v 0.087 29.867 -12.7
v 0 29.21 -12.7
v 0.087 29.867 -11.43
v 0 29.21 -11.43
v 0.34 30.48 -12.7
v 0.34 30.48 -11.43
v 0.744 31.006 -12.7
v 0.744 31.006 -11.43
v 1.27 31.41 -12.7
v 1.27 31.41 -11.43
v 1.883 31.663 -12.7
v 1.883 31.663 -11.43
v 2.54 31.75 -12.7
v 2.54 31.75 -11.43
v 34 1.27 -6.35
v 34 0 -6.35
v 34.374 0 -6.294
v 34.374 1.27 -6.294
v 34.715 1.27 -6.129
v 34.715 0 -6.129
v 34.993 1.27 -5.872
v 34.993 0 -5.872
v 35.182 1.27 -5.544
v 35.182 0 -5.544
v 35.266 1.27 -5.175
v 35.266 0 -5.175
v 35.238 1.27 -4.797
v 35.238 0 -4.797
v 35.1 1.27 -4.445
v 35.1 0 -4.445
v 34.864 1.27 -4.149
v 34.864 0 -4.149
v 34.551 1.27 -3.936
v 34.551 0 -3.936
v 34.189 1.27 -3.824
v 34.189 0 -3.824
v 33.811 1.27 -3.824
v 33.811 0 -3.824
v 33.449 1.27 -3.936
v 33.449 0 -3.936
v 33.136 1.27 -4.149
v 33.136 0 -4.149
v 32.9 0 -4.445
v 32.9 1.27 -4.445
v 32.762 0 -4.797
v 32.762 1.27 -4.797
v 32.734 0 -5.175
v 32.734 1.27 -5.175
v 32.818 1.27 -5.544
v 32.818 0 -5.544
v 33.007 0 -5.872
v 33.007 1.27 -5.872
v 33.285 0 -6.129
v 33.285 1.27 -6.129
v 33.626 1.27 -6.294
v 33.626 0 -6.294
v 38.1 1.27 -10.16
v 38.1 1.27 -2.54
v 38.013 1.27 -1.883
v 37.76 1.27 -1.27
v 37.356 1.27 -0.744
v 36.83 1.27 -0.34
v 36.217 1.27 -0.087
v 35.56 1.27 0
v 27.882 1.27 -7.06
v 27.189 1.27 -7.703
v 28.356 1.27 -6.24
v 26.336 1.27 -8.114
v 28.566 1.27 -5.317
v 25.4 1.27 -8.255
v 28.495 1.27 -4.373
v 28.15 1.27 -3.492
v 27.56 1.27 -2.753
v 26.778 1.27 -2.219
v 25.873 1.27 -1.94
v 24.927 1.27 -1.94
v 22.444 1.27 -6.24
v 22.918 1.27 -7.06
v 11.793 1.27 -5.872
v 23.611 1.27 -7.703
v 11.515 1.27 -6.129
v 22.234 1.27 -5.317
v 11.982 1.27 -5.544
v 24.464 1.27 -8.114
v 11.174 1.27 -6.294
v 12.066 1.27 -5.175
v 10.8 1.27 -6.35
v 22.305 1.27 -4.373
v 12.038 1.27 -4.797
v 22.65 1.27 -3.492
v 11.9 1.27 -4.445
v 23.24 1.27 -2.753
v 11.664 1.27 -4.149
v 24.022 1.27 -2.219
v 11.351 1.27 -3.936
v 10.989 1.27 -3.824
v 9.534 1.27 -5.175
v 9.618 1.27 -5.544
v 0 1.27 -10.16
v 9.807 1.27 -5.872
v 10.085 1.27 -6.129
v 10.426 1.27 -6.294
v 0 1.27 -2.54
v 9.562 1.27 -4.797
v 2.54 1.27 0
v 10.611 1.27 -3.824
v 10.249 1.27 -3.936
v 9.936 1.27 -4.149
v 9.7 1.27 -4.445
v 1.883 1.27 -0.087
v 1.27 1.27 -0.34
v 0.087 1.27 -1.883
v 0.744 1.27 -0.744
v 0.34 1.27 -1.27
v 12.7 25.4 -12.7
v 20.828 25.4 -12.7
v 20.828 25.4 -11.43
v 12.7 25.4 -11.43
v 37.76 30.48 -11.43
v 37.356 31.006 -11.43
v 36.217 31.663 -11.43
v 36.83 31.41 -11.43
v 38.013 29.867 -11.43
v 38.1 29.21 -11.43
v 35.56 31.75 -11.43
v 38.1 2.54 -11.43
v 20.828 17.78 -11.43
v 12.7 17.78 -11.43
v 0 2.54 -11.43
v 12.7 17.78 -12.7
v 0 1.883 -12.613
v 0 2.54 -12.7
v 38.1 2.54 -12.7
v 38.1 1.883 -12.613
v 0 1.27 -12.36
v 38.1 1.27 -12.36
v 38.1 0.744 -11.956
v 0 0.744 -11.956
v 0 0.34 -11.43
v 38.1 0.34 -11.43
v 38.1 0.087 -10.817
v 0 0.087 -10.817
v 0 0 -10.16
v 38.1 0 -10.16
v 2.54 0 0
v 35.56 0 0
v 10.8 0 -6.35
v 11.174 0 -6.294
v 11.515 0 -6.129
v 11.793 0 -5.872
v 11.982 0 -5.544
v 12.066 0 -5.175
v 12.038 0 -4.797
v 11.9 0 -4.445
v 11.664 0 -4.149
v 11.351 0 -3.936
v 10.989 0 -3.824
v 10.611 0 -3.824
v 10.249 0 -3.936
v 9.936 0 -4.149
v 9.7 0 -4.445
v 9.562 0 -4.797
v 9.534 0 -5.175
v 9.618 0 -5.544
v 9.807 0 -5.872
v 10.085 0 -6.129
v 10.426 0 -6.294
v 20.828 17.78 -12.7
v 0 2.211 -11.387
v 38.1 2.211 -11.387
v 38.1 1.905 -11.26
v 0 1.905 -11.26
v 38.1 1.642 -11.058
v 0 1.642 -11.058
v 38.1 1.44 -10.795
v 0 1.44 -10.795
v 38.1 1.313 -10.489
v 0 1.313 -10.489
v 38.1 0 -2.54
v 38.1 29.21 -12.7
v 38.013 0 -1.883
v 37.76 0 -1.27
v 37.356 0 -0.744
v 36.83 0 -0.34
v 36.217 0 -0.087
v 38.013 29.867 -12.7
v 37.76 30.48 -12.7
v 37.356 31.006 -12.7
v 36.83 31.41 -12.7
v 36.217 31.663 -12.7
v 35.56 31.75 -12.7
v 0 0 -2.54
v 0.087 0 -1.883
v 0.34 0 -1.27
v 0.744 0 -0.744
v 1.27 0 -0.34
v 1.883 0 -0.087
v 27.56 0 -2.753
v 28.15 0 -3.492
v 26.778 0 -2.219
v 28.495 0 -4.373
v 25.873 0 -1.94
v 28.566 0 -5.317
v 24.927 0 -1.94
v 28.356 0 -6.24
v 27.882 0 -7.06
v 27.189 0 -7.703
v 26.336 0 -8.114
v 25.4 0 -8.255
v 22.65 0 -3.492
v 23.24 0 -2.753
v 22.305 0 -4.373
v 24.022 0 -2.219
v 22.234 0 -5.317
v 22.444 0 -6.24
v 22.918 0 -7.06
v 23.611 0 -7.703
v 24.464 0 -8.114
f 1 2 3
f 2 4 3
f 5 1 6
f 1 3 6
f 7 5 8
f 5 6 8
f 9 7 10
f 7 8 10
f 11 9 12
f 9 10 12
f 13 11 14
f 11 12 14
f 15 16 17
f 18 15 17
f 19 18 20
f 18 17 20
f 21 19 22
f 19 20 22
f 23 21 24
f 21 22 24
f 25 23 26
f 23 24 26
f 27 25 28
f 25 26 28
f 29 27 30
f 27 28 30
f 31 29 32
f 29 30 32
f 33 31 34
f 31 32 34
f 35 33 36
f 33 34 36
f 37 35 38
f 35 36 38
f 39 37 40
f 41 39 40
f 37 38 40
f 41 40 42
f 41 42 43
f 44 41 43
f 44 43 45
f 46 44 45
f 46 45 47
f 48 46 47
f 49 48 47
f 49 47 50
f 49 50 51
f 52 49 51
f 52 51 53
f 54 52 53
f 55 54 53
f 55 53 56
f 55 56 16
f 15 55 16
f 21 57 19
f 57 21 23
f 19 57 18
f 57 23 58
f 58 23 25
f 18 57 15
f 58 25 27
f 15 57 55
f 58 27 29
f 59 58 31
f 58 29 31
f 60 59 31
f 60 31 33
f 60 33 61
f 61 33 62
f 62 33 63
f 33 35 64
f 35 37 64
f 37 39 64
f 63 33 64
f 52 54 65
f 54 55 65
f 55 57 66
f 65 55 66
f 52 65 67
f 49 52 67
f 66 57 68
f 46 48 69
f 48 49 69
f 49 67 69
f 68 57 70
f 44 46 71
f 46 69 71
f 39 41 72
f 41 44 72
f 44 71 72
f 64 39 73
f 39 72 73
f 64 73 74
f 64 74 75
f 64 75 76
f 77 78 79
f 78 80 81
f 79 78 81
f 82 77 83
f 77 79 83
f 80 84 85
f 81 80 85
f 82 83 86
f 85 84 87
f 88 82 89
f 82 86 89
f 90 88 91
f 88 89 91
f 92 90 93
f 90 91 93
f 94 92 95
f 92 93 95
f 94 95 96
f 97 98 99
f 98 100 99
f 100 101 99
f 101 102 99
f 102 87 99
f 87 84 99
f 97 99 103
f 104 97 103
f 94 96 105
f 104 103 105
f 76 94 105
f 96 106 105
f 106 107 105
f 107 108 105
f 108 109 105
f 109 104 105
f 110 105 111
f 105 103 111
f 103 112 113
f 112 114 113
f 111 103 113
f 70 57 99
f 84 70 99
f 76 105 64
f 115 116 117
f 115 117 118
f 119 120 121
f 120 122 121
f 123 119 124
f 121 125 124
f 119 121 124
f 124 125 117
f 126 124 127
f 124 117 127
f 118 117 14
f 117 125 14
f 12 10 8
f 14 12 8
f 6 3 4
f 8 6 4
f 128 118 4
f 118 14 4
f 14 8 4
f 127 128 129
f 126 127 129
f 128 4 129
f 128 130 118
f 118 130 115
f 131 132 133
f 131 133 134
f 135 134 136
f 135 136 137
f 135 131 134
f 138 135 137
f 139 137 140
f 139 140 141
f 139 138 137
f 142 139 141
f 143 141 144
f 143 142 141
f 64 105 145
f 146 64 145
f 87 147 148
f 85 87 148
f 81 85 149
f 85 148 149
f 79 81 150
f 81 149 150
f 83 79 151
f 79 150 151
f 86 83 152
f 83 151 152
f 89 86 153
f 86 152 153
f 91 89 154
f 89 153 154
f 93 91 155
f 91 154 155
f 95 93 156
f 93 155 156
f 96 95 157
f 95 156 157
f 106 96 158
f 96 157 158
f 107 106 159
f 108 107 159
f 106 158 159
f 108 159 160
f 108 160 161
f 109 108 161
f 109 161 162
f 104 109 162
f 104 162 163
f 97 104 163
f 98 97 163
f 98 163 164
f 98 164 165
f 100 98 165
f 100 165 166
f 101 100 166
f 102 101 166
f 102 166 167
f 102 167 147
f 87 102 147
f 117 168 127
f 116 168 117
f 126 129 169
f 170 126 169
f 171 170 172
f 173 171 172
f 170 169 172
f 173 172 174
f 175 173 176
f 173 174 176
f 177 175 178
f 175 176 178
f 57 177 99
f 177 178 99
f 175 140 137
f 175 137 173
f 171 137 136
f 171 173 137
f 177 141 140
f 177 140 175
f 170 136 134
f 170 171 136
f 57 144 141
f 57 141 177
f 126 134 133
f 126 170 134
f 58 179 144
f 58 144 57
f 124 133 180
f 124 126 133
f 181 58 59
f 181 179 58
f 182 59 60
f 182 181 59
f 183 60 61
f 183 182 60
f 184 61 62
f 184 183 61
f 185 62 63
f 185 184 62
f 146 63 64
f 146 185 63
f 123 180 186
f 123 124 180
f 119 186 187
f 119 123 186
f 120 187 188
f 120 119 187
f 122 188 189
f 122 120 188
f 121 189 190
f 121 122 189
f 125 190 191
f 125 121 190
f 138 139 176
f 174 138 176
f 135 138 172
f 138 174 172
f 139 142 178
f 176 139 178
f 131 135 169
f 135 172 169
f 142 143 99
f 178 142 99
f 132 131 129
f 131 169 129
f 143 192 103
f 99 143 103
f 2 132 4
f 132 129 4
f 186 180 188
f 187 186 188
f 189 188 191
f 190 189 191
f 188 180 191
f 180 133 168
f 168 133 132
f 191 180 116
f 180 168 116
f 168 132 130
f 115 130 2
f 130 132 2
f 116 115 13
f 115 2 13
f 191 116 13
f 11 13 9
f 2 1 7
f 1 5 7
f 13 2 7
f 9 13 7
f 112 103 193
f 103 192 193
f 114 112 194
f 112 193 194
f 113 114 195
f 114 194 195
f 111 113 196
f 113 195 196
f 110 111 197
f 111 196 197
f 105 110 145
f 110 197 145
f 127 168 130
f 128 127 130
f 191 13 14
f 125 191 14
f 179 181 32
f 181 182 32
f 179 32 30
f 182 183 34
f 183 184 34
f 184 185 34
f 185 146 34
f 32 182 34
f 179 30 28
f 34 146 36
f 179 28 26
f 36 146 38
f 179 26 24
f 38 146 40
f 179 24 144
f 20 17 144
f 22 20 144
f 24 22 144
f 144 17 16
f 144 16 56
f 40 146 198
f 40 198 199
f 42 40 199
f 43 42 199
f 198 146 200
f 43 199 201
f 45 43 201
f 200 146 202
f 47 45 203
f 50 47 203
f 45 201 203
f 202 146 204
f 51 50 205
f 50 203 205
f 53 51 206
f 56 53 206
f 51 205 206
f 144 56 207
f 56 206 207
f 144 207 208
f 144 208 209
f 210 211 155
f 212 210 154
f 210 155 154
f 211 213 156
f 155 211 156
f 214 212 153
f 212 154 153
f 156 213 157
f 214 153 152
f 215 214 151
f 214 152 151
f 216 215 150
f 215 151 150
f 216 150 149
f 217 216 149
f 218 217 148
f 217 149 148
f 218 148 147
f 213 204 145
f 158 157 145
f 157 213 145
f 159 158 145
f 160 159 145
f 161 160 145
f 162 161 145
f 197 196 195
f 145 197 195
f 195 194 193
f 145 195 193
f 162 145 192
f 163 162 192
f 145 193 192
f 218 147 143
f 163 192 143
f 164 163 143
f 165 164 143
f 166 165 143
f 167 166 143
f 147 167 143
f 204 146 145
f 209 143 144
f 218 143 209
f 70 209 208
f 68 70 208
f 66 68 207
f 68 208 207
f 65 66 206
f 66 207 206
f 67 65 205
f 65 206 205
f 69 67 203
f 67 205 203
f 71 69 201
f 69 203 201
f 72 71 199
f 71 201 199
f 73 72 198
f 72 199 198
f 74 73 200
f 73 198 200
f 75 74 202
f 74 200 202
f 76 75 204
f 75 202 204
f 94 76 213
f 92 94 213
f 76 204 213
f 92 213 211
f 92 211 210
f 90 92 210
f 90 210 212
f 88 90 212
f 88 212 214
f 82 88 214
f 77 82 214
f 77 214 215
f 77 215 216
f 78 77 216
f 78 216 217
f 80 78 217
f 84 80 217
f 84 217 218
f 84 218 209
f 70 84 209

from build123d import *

# Parameters (mm, degrees)
BOSS_EXTRUDE1_DEPTH    = 38.1
SKETCH2_W              = 8.128
SKETCH2_H              = 7.62
CUT_EXTRUDE1_DEPTH     = 52.195336702
CONVERT_SOLID1_DEPTH   = 38.1
CONVERT_SOLID1_2_DEPTH = 38.1
FILLET1_R              = 2.54
SKETCH7_R              = 3.175
CUT_EXTRUDE2_DEPTH     = 52.195336702
SKETCH8_R              = 1.27
CUT_EXTRUDE3_DEPTH     = 52.195336702


# Read off the part's stored shape, not the designer's step: Convert-Solid1
with BuildPart() as part:
    # Sketch1 → Boss-Extrude1 (new body)
    with BuildSketch(Plane(origin=(0, 0, 0), x_dir=(0, 0, -1), z_dir=(1, 0, 0))):
        Polygon((0, 0), (12.7, 0), (12.7, 31.75), (11.43, 31.75), (11.43, 1.27), (0, 1.27), align=None)
    extrude(amount=BOSS_EXTRUDE1_DEPTH)

    # Sketch2 → Cut-Extrude1 (cut, through all)
    with BuildSketch(Plane(origin=(0, 0, -12.7), x_dir=(-1, 0, 0), z_dir=(0, 0, -1))):
        with Locations((-16.764, 21.59)):
            Rectangle(SKETCH2_W, SKETCH2_H)
    extrude(amount=-CUT_EXTRUDE1_DEPTH, mode=Mode.SUBTRACT)

    # Convert-Solid1 outline → Convert-Solid1 (cut)
    with BuildSketch(Plane.YZ):
        with BuildLine():
            ThreePointArc((2.54, -12.7), (0.743948776, -11.956051224), (0, -10.16))
            Line((0, -10.16), (0, -12.7))
            Line((0, -12.7), (2.54, -12.7))
        make_face()
    extrude(amount=CONVERT_SOLID1_DEPTH, mode=Mode.SUBTRACT)

    # Convert-Solid1 2 outline → Convert-Solid1 2 (add)
    with BuildSketch(Plane.YZ):
        with BuildLine():
            ThreePointArc((2.54, -11.43), (1.641974388, -11.058025612), (1.27, -10.16))
            Line((1.27, -10.16), (1.27, -11.43))
            Line((1.27, -11.43), (2.54, -11.43))
        make_face()
    extrude(amount=CONVERT_SOLID1_2_DEPTH)

    # Fillet1
    fillet1_edges = [part.edges().sort_by_distance(p)[0] for p in [
        (0, 31.75, -12.065),
        (38.1, 31.75, -12.065),
        (38.1, 0.635, 0),
        (0, 0.635, 0),
    ]]
    fillet(fillet1_edges, radius=FILLET1_R)

    # Sketch7 → Cut-Extrude2 (cut, through all)
    with BuildSketch(Plane.XZ):
        with Locations(Location((25.4, -5.08, 0), (0, 0, 270))):
            Circle(SKETCH7_R)
    extrude(amount=-CUT_EXTRUDE2_DEPTH, mode=Mode.SUBTRACT)

    # Sketch8 → Cut-Extrude3 (cut, through all)
    with BuildSketch(Plane.XZ):
        with Locations(Location((10.8, -5.08, 0), (0, 0, 270))):
            Circle(SKETCH8_R)
        with Locations(Location((34, -5.08, 0), (0, 0, 270))):
            Circle(SKETCH8_R)
    extrude(amount=-CUT_EXTRUDE3_DEPTH, mode=Mode.SUBTRACT)


solid = part.part
